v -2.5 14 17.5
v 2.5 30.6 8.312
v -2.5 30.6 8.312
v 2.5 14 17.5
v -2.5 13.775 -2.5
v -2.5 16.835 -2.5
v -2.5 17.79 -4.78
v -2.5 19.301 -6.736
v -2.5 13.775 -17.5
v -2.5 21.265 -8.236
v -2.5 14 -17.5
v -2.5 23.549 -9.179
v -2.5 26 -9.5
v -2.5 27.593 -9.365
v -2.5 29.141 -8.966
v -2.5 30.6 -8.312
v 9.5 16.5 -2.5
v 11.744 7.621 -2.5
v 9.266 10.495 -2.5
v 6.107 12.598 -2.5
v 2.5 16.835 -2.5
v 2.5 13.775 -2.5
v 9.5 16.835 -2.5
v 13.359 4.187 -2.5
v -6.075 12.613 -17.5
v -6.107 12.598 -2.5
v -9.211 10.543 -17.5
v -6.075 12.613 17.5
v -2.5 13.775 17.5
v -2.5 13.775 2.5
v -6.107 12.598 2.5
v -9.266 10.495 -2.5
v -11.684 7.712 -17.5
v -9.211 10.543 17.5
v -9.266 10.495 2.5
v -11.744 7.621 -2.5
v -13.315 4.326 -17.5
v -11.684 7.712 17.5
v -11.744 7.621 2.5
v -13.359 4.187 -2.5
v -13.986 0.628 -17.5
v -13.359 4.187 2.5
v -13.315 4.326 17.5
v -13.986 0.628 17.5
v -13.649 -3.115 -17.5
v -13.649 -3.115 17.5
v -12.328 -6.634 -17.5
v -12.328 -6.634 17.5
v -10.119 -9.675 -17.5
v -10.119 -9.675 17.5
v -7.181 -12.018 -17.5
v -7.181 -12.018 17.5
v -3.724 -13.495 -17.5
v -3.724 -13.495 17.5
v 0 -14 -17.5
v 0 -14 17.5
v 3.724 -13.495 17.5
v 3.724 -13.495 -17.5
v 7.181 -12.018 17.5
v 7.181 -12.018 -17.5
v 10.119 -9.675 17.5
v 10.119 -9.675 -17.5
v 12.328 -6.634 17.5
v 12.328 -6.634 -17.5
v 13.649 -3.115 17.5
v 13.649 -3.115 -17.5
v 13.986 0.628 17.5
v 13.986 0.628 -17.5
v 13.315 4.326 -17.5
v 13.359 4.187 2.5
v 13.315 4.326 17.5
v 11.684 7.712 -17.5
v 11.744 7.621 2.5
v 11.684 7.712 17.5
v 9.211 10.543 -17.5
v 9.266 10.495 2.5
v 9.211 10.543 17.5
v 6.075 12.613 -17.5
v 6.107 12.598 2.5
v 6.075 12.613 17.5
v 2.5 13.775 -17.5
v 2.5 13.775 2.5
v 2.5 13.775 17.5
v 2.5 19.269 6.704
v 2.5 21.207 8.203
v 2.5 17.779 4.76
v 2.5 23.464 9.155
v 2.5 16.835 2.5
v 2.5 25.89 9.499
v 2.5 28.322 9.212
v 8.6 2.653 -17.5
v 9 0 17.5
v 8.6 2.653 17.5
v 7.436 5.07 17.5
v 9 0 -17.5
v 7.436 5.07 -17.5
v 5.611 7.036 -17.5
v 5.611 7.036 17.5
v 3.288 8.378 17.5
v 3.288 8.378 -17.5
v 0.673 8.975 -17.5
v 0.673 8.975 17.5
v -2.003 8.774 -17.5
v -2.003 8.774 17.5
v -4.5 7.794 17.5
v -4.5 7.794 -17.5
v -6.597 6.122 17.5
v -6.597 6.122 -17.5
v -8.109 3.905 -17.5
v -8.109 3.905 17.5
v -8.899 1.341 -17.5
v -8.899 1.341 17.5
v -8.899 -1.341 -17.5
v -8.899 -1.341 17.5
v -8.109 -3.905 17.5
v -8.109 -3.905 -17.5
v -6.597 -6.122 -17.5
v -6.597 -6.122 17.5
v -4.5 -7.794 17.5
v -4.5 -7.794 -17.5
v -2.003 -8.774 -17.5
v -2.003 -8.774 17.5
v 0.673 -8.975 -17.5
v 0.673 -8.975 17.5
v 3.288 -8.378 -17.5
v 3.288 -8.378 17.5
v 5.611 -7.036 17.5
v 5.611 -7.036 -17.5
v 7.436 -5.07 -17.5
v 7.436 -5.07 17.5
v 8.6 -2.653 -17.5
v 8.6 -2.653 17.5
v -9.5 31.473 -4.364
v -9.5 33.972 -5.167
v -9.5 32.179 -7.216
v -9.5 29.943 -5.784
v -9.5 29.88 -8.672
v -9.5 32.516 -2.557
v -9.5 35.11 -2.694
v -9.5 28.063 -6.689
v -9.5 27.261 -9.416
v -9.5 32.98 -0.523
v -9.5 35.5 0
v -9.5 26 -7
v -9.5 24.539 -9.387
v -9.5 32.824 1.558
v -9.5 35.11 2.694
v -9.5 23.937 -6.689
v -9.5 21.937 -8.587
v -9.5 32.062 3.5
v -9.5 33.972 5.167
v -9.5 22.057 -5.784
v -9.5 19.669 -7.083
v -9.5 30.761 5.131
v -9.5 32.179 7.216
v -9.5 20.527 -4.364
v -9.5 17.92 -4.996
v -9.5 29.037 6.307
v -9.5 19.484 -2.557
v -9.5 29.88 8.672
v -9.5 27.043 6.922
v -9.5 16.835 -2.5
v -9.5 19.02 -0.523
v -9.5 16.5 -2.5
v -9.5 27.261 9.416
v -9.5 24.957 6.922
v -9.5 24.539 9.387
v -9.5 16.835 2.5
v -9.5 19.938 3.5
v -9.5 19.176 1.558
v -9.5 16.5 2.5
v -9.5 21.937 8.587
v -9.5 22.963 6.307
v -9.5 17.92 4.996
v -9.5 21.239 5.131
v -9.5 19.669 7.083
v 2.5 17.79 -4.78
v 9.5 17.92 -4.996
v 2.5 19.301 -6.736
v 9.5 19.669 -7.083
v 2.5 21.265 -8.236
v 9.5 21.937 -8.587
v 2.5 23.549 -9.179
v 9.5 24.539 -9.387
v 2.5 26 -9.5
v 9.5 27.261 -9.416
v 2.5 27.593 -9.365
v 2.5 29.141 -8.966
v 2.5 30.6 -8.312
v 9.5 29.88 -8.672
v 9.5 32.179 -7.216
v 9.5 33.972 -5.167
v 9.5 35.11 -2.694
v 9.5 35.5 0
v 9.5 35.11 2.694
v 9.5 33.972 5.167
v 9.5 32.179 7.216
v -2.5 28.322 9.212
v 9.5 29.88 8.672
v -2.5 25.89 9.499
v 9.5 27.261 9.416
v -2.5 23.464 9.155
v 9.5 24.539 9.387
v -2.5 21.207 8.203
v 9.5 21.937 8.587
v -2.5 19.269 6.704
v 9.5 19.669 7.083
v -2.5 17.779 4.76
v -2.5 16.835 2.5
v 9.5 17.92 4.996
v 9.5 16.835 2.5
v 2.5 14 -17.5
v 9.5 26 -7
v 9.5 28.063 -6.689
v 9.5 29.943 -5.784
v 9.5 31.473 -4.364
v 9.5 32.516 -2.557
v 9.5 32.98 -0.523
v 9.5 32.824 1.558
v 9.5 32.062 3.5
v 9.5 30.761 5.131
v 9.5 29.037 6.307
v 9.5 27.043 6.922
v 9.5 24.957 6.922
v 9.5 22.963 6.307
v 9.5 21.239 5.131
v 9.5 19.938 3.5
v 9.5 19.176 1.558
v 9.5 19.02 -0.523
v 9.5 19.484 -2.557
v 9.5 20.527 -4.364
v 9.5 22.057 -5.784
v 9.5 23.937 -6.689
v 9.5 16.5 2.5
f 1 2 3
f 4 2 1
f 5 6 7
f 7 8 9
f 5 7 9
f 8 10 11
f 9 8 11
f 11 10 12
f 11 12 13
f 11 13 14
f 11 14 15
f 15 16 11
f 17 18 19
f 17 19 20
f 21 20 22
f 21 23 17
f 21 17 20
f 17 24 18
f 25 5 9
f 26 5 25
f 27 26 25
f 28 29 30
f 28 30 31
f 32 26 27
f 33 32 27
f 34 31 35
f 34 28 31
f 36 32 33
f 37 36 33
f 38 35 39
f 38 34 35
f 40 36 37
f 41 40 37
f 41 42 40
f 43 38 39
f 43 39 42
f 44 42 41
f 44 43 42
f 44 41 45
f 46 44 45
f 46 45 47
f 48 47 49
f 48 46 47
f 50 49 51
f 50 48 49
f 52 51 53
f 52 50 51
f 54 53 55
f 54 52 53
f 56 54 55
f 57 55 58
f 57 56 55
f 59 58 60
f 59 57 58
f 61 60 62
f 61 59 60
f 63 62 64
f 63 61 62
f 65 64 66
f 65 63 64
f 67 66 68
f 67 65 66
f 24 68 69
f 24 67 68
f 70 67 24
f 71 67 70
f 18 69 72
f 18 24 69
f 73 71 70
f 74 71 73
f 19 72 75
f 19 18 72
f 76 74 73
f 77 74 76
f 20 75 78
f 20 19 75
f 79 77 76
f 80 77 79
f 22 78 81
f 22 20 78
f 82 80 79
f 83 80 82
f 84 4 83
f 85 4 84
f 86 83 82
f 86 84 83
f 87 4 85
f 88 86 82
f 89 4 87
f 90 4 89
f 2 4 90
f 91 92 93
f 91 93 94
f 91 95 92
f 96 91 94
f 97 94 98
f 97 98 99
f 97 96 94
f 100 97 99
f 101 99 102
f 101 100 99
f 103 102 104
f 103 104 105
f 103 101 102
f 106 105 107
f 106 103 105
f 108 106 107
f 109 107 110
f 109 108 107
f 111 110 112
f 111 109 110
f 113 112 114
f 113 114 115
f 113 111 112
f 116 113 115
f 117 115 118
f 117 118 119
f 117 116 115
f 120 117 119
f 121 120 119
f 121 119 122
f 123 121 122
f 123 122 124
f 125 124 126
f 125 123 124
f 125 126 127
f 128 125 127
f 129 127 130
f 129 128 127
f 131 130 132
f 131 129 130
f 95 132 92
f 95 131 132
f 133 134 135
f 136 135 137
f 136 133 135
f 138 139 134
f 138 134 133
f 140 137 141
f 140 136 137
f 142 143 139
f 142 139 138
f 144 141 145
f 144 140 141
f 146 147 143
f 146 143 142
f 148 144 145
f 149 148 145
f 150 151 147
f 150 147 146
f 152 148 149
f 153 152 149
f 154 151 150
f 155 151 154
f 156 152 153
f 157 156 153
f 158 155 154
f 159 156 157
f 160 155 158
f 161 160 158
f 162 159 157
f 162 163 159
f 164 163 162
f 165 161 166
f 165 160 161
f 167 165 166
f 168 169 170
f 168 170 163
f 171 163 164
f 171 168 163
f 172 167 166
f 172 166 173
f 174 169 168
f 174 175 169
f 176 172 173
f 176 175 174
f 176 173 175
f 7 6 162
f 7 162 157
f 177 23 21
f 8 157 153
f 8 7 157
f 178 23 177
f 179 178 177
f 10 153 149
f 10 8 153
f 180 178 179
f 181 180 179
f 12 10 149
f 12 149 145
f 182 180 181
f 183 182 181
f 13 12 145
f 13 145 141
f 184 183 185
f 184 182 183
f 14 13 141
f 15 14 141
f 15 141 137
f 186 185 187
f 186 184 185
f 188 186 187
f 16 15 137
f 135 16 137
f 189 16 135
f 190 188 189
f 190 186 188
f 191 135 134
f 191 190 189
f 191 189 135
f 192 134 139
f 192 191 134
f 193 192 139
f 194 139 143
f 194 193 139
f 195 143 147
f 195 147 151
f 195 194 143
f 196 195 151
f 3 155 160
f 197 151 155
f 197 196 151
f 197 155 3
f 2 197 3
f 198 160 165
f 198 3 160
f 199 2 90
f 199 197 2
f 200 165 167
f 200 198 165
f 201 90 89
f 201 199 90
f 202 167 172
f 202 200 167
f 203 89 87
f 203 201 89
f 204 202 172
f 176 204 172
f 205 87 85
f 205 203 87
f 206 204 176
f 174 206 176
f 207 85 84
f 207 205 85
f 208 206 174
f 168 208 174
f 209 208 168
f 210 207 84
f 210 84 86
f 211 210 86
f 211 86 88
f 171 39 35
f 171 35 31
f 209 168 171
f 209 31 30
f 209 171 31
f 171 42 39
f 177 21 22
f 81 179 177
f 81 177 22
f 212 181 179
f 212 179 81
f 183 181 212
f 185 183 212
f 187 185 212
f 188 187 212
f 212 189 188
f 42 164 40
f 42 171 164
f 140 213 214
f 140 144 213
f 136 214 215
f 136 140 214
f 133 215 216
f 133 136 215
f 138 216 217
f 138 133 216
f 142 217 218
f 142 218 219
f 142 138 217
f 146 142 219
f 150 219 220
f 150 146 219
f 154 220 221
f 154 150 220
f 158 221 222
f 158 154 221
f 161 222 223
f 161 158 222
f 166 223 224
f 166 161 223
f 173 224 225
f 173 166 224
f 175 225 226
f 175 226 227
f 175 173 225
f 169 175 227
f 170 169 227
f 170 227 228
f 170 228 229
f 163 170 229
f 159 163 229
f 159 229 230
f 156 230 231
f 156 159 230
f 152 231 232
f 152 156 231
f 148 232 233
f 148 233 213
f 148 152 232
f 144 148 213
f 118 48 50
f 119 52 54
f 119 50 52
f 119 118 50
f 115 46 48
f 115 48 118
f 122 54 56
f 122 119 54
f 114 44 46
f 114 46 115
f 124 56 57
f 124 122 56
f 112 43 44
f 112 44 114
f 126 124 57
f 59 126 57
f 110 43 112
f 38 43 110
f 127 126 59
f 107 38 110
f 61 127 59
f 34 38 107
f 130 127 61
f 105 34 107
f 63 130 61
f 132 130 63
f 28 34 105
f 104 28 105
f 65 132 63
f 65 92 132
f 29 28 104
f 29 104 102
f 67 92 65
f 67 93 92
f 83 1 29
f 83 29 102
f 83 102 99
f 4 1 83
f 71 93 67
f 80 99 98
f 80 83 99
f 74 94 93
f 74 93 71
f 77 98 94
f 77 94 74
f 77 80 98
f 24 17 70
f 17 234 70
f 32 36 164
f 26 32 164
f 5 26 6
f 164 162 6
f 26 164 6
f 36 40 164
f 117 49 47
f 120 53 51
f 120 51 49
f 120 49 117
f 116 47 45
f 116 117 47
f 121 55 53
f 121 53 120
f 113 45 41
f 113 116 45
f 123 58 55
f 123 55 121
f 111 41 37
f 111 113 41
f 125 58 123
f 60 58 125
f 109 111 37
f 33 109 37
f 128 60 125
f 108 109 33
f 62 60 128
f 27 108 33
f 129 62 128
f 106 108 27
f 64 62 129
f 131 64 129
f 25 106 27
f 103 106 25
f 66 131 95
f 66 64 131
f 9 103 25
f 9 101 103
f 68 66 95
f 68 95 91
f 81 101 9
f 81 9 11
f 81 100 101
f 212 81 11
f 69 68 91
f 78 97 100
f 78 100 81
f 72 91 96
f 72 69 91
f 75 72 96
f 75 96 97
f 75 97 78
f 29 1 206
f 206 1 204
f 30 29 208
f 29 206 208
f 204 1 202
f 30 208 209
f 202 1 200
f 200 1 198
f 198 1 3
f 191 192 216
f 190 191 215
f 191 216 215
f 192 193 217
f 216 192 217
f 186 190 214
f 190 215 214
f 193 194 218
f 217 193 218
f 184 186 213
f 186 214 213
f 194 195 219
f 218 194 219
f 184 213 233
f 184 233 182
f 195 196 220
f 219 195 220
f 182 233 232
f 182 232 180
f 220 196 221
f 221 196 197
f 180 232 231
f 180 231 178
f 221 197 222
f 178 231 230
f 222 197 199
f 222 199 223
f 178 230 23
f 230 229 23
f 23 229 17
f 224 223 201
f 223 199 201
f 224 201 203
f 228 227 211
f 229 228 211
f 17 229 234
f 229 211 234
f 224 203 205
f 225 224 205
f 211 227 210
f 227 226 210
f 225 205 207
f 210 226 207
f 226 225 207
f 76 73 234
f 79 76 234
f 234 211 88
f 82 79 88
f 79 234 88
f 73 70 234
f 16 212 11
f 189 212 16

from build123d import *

# Parameters (mm, degrees)
SKETCH1_R           = 14
SKETCH1_R_2         = 9
BOSS_EXTRUDE1_DEPTH = 17.5
SKETCH5_R           = 9.5
SKETCH5_R_2         = 7
BOSS_EXTRUDE2_DEPTH = 9.5
BOSS_EXTRUDE3_DEPTH = 2.5
SKETCH7_W           = 5
SKETCH7_H           = 17.5
BOSS_EXTRUDE4_DEPTH = 0.225023
BOSS_EXTRUDE5_DEPTH = 2.5
BOSS_EXTRUDE9_DEPTH = 2.5


with BuildPart() as part:
    # Sketch1 → Boss-Extrude1 (new, symmetric)
    with BuildSketch(Plane.XY):
        Circle(SKETCH1_R)
        Circle(SKETCH1_R_2, mode=Mode.SUBTRACT)
    extrude(amount=BOSS_EXTRUDE1_DEPTH, both=True)



with BuildPart() as body_2:
    # Sketch5 → Boss-Extrude2 (new, symmetric)
    with BuildSketch(Plane(origin=(0, 0, 0), x_dir=(0, 0, -1), z_dir=(1, 0, 0))):
        with Locations((0, 26)):
            Circle(SKETCH5_R)
        with Locations((0, 26)):
            Circle(SKETCH5_R_2, mode=Mode.SUBTRACT)
    extrude(amount=BOSS_EXTRUDE2_DEPTH, both=True)

    # Sketch6 → Boss-Extrude3 (add, symmetric)
    with BuildSketch(Plane(origin=(0, 0, 0), x_dir=(0, 0, -1), z_dir=(1, 0, 0))):
        with BuildLine():
            Line((-8.311766618, 30.600492984), (-17.5, 14))
            Line((-17.5, 14), (0, 14))
            Line((0, 14), (0, 16.5))
            ThreePointArc((0, 16.5), (-8.183968577, 21.175825633), (-8.311766618, 30.600492984))
        make_face()
    extrude(amount=BOSS_EXTRUDE3_DEPTH, both=True)


with BuildPart() as part_1:
    add(part.part)

    add(body_2.part)  # Boss-Extrude4 merges body 2
    # Sketch7 → Boss-Extrude4 (add)
    with BuildSketch(Plane.XZ.offset(-14)):
        with Locations((0, 8.75)):
            Rectangle(SKETCH7_W, SKETCH7_H)
    extrude(amount=BOSS_EXTRUDE4_DEPTH)

    # Sketch8 → Boss-Extrude5 (add, symmetric)
    with BuildSketch(Plane(origin=(0, 0, 0), x_dir=(0, 0, -1), z_dir=(1, 0, 0))):
        with BuildLine():
            Line((17.5, 14), (8.311766618, 30.600492984))
            ThreePointArc((8.311766618, 30.600492984), (9.198146087, 28.375733269), (9.5, 26))
            ThreePointArc((9.5, 26), (6.717514421, 19.282485579), (0, 16.5))
            Line((0, 16.5), (0, 14))
            Line((0, 14), (0, 13.650311759))
            Line((0, 13.650311759), (17.5, 13.650311759))
            Line((17.5, 13.650311759), (17.5, 14))
        make_face()
    extrude(amount=BOSS_EXTRUDE5_DEPTH, both=True)

    # Sketch9 → Boss-Extrude9 (add, symmetric)
    with BuildSketch(Plane.XY):
        with BuildLine():
            ThreePointArc((-13.359188152, 4.187134094), (-8.28794675, 11.283170594), (0, 14))
            Line((0, 14), (0, 16.5))
            Line((0, 16.5), (0, 17.5))
            Line((0, 17.5), (-9.5, 17.5))
            Line((-9.5, 17.5), (-9.5, 16.5))
            Line((-9.5, 16.5), (-13.359188152, 4.187134094))
        make_face()
    boss_extrude9 = extrude(amount=BOSS_EXTRUDE9_DEPTH, both=True)

    # Mirror9: Boss-Extrude9 across plane
    add(boss_extrude9.mirror(Plane(origin=(0, 0, 0), x_dir=(0, 0, 1), z_dir=(1, 0, 0))))


solid = part_1.part
